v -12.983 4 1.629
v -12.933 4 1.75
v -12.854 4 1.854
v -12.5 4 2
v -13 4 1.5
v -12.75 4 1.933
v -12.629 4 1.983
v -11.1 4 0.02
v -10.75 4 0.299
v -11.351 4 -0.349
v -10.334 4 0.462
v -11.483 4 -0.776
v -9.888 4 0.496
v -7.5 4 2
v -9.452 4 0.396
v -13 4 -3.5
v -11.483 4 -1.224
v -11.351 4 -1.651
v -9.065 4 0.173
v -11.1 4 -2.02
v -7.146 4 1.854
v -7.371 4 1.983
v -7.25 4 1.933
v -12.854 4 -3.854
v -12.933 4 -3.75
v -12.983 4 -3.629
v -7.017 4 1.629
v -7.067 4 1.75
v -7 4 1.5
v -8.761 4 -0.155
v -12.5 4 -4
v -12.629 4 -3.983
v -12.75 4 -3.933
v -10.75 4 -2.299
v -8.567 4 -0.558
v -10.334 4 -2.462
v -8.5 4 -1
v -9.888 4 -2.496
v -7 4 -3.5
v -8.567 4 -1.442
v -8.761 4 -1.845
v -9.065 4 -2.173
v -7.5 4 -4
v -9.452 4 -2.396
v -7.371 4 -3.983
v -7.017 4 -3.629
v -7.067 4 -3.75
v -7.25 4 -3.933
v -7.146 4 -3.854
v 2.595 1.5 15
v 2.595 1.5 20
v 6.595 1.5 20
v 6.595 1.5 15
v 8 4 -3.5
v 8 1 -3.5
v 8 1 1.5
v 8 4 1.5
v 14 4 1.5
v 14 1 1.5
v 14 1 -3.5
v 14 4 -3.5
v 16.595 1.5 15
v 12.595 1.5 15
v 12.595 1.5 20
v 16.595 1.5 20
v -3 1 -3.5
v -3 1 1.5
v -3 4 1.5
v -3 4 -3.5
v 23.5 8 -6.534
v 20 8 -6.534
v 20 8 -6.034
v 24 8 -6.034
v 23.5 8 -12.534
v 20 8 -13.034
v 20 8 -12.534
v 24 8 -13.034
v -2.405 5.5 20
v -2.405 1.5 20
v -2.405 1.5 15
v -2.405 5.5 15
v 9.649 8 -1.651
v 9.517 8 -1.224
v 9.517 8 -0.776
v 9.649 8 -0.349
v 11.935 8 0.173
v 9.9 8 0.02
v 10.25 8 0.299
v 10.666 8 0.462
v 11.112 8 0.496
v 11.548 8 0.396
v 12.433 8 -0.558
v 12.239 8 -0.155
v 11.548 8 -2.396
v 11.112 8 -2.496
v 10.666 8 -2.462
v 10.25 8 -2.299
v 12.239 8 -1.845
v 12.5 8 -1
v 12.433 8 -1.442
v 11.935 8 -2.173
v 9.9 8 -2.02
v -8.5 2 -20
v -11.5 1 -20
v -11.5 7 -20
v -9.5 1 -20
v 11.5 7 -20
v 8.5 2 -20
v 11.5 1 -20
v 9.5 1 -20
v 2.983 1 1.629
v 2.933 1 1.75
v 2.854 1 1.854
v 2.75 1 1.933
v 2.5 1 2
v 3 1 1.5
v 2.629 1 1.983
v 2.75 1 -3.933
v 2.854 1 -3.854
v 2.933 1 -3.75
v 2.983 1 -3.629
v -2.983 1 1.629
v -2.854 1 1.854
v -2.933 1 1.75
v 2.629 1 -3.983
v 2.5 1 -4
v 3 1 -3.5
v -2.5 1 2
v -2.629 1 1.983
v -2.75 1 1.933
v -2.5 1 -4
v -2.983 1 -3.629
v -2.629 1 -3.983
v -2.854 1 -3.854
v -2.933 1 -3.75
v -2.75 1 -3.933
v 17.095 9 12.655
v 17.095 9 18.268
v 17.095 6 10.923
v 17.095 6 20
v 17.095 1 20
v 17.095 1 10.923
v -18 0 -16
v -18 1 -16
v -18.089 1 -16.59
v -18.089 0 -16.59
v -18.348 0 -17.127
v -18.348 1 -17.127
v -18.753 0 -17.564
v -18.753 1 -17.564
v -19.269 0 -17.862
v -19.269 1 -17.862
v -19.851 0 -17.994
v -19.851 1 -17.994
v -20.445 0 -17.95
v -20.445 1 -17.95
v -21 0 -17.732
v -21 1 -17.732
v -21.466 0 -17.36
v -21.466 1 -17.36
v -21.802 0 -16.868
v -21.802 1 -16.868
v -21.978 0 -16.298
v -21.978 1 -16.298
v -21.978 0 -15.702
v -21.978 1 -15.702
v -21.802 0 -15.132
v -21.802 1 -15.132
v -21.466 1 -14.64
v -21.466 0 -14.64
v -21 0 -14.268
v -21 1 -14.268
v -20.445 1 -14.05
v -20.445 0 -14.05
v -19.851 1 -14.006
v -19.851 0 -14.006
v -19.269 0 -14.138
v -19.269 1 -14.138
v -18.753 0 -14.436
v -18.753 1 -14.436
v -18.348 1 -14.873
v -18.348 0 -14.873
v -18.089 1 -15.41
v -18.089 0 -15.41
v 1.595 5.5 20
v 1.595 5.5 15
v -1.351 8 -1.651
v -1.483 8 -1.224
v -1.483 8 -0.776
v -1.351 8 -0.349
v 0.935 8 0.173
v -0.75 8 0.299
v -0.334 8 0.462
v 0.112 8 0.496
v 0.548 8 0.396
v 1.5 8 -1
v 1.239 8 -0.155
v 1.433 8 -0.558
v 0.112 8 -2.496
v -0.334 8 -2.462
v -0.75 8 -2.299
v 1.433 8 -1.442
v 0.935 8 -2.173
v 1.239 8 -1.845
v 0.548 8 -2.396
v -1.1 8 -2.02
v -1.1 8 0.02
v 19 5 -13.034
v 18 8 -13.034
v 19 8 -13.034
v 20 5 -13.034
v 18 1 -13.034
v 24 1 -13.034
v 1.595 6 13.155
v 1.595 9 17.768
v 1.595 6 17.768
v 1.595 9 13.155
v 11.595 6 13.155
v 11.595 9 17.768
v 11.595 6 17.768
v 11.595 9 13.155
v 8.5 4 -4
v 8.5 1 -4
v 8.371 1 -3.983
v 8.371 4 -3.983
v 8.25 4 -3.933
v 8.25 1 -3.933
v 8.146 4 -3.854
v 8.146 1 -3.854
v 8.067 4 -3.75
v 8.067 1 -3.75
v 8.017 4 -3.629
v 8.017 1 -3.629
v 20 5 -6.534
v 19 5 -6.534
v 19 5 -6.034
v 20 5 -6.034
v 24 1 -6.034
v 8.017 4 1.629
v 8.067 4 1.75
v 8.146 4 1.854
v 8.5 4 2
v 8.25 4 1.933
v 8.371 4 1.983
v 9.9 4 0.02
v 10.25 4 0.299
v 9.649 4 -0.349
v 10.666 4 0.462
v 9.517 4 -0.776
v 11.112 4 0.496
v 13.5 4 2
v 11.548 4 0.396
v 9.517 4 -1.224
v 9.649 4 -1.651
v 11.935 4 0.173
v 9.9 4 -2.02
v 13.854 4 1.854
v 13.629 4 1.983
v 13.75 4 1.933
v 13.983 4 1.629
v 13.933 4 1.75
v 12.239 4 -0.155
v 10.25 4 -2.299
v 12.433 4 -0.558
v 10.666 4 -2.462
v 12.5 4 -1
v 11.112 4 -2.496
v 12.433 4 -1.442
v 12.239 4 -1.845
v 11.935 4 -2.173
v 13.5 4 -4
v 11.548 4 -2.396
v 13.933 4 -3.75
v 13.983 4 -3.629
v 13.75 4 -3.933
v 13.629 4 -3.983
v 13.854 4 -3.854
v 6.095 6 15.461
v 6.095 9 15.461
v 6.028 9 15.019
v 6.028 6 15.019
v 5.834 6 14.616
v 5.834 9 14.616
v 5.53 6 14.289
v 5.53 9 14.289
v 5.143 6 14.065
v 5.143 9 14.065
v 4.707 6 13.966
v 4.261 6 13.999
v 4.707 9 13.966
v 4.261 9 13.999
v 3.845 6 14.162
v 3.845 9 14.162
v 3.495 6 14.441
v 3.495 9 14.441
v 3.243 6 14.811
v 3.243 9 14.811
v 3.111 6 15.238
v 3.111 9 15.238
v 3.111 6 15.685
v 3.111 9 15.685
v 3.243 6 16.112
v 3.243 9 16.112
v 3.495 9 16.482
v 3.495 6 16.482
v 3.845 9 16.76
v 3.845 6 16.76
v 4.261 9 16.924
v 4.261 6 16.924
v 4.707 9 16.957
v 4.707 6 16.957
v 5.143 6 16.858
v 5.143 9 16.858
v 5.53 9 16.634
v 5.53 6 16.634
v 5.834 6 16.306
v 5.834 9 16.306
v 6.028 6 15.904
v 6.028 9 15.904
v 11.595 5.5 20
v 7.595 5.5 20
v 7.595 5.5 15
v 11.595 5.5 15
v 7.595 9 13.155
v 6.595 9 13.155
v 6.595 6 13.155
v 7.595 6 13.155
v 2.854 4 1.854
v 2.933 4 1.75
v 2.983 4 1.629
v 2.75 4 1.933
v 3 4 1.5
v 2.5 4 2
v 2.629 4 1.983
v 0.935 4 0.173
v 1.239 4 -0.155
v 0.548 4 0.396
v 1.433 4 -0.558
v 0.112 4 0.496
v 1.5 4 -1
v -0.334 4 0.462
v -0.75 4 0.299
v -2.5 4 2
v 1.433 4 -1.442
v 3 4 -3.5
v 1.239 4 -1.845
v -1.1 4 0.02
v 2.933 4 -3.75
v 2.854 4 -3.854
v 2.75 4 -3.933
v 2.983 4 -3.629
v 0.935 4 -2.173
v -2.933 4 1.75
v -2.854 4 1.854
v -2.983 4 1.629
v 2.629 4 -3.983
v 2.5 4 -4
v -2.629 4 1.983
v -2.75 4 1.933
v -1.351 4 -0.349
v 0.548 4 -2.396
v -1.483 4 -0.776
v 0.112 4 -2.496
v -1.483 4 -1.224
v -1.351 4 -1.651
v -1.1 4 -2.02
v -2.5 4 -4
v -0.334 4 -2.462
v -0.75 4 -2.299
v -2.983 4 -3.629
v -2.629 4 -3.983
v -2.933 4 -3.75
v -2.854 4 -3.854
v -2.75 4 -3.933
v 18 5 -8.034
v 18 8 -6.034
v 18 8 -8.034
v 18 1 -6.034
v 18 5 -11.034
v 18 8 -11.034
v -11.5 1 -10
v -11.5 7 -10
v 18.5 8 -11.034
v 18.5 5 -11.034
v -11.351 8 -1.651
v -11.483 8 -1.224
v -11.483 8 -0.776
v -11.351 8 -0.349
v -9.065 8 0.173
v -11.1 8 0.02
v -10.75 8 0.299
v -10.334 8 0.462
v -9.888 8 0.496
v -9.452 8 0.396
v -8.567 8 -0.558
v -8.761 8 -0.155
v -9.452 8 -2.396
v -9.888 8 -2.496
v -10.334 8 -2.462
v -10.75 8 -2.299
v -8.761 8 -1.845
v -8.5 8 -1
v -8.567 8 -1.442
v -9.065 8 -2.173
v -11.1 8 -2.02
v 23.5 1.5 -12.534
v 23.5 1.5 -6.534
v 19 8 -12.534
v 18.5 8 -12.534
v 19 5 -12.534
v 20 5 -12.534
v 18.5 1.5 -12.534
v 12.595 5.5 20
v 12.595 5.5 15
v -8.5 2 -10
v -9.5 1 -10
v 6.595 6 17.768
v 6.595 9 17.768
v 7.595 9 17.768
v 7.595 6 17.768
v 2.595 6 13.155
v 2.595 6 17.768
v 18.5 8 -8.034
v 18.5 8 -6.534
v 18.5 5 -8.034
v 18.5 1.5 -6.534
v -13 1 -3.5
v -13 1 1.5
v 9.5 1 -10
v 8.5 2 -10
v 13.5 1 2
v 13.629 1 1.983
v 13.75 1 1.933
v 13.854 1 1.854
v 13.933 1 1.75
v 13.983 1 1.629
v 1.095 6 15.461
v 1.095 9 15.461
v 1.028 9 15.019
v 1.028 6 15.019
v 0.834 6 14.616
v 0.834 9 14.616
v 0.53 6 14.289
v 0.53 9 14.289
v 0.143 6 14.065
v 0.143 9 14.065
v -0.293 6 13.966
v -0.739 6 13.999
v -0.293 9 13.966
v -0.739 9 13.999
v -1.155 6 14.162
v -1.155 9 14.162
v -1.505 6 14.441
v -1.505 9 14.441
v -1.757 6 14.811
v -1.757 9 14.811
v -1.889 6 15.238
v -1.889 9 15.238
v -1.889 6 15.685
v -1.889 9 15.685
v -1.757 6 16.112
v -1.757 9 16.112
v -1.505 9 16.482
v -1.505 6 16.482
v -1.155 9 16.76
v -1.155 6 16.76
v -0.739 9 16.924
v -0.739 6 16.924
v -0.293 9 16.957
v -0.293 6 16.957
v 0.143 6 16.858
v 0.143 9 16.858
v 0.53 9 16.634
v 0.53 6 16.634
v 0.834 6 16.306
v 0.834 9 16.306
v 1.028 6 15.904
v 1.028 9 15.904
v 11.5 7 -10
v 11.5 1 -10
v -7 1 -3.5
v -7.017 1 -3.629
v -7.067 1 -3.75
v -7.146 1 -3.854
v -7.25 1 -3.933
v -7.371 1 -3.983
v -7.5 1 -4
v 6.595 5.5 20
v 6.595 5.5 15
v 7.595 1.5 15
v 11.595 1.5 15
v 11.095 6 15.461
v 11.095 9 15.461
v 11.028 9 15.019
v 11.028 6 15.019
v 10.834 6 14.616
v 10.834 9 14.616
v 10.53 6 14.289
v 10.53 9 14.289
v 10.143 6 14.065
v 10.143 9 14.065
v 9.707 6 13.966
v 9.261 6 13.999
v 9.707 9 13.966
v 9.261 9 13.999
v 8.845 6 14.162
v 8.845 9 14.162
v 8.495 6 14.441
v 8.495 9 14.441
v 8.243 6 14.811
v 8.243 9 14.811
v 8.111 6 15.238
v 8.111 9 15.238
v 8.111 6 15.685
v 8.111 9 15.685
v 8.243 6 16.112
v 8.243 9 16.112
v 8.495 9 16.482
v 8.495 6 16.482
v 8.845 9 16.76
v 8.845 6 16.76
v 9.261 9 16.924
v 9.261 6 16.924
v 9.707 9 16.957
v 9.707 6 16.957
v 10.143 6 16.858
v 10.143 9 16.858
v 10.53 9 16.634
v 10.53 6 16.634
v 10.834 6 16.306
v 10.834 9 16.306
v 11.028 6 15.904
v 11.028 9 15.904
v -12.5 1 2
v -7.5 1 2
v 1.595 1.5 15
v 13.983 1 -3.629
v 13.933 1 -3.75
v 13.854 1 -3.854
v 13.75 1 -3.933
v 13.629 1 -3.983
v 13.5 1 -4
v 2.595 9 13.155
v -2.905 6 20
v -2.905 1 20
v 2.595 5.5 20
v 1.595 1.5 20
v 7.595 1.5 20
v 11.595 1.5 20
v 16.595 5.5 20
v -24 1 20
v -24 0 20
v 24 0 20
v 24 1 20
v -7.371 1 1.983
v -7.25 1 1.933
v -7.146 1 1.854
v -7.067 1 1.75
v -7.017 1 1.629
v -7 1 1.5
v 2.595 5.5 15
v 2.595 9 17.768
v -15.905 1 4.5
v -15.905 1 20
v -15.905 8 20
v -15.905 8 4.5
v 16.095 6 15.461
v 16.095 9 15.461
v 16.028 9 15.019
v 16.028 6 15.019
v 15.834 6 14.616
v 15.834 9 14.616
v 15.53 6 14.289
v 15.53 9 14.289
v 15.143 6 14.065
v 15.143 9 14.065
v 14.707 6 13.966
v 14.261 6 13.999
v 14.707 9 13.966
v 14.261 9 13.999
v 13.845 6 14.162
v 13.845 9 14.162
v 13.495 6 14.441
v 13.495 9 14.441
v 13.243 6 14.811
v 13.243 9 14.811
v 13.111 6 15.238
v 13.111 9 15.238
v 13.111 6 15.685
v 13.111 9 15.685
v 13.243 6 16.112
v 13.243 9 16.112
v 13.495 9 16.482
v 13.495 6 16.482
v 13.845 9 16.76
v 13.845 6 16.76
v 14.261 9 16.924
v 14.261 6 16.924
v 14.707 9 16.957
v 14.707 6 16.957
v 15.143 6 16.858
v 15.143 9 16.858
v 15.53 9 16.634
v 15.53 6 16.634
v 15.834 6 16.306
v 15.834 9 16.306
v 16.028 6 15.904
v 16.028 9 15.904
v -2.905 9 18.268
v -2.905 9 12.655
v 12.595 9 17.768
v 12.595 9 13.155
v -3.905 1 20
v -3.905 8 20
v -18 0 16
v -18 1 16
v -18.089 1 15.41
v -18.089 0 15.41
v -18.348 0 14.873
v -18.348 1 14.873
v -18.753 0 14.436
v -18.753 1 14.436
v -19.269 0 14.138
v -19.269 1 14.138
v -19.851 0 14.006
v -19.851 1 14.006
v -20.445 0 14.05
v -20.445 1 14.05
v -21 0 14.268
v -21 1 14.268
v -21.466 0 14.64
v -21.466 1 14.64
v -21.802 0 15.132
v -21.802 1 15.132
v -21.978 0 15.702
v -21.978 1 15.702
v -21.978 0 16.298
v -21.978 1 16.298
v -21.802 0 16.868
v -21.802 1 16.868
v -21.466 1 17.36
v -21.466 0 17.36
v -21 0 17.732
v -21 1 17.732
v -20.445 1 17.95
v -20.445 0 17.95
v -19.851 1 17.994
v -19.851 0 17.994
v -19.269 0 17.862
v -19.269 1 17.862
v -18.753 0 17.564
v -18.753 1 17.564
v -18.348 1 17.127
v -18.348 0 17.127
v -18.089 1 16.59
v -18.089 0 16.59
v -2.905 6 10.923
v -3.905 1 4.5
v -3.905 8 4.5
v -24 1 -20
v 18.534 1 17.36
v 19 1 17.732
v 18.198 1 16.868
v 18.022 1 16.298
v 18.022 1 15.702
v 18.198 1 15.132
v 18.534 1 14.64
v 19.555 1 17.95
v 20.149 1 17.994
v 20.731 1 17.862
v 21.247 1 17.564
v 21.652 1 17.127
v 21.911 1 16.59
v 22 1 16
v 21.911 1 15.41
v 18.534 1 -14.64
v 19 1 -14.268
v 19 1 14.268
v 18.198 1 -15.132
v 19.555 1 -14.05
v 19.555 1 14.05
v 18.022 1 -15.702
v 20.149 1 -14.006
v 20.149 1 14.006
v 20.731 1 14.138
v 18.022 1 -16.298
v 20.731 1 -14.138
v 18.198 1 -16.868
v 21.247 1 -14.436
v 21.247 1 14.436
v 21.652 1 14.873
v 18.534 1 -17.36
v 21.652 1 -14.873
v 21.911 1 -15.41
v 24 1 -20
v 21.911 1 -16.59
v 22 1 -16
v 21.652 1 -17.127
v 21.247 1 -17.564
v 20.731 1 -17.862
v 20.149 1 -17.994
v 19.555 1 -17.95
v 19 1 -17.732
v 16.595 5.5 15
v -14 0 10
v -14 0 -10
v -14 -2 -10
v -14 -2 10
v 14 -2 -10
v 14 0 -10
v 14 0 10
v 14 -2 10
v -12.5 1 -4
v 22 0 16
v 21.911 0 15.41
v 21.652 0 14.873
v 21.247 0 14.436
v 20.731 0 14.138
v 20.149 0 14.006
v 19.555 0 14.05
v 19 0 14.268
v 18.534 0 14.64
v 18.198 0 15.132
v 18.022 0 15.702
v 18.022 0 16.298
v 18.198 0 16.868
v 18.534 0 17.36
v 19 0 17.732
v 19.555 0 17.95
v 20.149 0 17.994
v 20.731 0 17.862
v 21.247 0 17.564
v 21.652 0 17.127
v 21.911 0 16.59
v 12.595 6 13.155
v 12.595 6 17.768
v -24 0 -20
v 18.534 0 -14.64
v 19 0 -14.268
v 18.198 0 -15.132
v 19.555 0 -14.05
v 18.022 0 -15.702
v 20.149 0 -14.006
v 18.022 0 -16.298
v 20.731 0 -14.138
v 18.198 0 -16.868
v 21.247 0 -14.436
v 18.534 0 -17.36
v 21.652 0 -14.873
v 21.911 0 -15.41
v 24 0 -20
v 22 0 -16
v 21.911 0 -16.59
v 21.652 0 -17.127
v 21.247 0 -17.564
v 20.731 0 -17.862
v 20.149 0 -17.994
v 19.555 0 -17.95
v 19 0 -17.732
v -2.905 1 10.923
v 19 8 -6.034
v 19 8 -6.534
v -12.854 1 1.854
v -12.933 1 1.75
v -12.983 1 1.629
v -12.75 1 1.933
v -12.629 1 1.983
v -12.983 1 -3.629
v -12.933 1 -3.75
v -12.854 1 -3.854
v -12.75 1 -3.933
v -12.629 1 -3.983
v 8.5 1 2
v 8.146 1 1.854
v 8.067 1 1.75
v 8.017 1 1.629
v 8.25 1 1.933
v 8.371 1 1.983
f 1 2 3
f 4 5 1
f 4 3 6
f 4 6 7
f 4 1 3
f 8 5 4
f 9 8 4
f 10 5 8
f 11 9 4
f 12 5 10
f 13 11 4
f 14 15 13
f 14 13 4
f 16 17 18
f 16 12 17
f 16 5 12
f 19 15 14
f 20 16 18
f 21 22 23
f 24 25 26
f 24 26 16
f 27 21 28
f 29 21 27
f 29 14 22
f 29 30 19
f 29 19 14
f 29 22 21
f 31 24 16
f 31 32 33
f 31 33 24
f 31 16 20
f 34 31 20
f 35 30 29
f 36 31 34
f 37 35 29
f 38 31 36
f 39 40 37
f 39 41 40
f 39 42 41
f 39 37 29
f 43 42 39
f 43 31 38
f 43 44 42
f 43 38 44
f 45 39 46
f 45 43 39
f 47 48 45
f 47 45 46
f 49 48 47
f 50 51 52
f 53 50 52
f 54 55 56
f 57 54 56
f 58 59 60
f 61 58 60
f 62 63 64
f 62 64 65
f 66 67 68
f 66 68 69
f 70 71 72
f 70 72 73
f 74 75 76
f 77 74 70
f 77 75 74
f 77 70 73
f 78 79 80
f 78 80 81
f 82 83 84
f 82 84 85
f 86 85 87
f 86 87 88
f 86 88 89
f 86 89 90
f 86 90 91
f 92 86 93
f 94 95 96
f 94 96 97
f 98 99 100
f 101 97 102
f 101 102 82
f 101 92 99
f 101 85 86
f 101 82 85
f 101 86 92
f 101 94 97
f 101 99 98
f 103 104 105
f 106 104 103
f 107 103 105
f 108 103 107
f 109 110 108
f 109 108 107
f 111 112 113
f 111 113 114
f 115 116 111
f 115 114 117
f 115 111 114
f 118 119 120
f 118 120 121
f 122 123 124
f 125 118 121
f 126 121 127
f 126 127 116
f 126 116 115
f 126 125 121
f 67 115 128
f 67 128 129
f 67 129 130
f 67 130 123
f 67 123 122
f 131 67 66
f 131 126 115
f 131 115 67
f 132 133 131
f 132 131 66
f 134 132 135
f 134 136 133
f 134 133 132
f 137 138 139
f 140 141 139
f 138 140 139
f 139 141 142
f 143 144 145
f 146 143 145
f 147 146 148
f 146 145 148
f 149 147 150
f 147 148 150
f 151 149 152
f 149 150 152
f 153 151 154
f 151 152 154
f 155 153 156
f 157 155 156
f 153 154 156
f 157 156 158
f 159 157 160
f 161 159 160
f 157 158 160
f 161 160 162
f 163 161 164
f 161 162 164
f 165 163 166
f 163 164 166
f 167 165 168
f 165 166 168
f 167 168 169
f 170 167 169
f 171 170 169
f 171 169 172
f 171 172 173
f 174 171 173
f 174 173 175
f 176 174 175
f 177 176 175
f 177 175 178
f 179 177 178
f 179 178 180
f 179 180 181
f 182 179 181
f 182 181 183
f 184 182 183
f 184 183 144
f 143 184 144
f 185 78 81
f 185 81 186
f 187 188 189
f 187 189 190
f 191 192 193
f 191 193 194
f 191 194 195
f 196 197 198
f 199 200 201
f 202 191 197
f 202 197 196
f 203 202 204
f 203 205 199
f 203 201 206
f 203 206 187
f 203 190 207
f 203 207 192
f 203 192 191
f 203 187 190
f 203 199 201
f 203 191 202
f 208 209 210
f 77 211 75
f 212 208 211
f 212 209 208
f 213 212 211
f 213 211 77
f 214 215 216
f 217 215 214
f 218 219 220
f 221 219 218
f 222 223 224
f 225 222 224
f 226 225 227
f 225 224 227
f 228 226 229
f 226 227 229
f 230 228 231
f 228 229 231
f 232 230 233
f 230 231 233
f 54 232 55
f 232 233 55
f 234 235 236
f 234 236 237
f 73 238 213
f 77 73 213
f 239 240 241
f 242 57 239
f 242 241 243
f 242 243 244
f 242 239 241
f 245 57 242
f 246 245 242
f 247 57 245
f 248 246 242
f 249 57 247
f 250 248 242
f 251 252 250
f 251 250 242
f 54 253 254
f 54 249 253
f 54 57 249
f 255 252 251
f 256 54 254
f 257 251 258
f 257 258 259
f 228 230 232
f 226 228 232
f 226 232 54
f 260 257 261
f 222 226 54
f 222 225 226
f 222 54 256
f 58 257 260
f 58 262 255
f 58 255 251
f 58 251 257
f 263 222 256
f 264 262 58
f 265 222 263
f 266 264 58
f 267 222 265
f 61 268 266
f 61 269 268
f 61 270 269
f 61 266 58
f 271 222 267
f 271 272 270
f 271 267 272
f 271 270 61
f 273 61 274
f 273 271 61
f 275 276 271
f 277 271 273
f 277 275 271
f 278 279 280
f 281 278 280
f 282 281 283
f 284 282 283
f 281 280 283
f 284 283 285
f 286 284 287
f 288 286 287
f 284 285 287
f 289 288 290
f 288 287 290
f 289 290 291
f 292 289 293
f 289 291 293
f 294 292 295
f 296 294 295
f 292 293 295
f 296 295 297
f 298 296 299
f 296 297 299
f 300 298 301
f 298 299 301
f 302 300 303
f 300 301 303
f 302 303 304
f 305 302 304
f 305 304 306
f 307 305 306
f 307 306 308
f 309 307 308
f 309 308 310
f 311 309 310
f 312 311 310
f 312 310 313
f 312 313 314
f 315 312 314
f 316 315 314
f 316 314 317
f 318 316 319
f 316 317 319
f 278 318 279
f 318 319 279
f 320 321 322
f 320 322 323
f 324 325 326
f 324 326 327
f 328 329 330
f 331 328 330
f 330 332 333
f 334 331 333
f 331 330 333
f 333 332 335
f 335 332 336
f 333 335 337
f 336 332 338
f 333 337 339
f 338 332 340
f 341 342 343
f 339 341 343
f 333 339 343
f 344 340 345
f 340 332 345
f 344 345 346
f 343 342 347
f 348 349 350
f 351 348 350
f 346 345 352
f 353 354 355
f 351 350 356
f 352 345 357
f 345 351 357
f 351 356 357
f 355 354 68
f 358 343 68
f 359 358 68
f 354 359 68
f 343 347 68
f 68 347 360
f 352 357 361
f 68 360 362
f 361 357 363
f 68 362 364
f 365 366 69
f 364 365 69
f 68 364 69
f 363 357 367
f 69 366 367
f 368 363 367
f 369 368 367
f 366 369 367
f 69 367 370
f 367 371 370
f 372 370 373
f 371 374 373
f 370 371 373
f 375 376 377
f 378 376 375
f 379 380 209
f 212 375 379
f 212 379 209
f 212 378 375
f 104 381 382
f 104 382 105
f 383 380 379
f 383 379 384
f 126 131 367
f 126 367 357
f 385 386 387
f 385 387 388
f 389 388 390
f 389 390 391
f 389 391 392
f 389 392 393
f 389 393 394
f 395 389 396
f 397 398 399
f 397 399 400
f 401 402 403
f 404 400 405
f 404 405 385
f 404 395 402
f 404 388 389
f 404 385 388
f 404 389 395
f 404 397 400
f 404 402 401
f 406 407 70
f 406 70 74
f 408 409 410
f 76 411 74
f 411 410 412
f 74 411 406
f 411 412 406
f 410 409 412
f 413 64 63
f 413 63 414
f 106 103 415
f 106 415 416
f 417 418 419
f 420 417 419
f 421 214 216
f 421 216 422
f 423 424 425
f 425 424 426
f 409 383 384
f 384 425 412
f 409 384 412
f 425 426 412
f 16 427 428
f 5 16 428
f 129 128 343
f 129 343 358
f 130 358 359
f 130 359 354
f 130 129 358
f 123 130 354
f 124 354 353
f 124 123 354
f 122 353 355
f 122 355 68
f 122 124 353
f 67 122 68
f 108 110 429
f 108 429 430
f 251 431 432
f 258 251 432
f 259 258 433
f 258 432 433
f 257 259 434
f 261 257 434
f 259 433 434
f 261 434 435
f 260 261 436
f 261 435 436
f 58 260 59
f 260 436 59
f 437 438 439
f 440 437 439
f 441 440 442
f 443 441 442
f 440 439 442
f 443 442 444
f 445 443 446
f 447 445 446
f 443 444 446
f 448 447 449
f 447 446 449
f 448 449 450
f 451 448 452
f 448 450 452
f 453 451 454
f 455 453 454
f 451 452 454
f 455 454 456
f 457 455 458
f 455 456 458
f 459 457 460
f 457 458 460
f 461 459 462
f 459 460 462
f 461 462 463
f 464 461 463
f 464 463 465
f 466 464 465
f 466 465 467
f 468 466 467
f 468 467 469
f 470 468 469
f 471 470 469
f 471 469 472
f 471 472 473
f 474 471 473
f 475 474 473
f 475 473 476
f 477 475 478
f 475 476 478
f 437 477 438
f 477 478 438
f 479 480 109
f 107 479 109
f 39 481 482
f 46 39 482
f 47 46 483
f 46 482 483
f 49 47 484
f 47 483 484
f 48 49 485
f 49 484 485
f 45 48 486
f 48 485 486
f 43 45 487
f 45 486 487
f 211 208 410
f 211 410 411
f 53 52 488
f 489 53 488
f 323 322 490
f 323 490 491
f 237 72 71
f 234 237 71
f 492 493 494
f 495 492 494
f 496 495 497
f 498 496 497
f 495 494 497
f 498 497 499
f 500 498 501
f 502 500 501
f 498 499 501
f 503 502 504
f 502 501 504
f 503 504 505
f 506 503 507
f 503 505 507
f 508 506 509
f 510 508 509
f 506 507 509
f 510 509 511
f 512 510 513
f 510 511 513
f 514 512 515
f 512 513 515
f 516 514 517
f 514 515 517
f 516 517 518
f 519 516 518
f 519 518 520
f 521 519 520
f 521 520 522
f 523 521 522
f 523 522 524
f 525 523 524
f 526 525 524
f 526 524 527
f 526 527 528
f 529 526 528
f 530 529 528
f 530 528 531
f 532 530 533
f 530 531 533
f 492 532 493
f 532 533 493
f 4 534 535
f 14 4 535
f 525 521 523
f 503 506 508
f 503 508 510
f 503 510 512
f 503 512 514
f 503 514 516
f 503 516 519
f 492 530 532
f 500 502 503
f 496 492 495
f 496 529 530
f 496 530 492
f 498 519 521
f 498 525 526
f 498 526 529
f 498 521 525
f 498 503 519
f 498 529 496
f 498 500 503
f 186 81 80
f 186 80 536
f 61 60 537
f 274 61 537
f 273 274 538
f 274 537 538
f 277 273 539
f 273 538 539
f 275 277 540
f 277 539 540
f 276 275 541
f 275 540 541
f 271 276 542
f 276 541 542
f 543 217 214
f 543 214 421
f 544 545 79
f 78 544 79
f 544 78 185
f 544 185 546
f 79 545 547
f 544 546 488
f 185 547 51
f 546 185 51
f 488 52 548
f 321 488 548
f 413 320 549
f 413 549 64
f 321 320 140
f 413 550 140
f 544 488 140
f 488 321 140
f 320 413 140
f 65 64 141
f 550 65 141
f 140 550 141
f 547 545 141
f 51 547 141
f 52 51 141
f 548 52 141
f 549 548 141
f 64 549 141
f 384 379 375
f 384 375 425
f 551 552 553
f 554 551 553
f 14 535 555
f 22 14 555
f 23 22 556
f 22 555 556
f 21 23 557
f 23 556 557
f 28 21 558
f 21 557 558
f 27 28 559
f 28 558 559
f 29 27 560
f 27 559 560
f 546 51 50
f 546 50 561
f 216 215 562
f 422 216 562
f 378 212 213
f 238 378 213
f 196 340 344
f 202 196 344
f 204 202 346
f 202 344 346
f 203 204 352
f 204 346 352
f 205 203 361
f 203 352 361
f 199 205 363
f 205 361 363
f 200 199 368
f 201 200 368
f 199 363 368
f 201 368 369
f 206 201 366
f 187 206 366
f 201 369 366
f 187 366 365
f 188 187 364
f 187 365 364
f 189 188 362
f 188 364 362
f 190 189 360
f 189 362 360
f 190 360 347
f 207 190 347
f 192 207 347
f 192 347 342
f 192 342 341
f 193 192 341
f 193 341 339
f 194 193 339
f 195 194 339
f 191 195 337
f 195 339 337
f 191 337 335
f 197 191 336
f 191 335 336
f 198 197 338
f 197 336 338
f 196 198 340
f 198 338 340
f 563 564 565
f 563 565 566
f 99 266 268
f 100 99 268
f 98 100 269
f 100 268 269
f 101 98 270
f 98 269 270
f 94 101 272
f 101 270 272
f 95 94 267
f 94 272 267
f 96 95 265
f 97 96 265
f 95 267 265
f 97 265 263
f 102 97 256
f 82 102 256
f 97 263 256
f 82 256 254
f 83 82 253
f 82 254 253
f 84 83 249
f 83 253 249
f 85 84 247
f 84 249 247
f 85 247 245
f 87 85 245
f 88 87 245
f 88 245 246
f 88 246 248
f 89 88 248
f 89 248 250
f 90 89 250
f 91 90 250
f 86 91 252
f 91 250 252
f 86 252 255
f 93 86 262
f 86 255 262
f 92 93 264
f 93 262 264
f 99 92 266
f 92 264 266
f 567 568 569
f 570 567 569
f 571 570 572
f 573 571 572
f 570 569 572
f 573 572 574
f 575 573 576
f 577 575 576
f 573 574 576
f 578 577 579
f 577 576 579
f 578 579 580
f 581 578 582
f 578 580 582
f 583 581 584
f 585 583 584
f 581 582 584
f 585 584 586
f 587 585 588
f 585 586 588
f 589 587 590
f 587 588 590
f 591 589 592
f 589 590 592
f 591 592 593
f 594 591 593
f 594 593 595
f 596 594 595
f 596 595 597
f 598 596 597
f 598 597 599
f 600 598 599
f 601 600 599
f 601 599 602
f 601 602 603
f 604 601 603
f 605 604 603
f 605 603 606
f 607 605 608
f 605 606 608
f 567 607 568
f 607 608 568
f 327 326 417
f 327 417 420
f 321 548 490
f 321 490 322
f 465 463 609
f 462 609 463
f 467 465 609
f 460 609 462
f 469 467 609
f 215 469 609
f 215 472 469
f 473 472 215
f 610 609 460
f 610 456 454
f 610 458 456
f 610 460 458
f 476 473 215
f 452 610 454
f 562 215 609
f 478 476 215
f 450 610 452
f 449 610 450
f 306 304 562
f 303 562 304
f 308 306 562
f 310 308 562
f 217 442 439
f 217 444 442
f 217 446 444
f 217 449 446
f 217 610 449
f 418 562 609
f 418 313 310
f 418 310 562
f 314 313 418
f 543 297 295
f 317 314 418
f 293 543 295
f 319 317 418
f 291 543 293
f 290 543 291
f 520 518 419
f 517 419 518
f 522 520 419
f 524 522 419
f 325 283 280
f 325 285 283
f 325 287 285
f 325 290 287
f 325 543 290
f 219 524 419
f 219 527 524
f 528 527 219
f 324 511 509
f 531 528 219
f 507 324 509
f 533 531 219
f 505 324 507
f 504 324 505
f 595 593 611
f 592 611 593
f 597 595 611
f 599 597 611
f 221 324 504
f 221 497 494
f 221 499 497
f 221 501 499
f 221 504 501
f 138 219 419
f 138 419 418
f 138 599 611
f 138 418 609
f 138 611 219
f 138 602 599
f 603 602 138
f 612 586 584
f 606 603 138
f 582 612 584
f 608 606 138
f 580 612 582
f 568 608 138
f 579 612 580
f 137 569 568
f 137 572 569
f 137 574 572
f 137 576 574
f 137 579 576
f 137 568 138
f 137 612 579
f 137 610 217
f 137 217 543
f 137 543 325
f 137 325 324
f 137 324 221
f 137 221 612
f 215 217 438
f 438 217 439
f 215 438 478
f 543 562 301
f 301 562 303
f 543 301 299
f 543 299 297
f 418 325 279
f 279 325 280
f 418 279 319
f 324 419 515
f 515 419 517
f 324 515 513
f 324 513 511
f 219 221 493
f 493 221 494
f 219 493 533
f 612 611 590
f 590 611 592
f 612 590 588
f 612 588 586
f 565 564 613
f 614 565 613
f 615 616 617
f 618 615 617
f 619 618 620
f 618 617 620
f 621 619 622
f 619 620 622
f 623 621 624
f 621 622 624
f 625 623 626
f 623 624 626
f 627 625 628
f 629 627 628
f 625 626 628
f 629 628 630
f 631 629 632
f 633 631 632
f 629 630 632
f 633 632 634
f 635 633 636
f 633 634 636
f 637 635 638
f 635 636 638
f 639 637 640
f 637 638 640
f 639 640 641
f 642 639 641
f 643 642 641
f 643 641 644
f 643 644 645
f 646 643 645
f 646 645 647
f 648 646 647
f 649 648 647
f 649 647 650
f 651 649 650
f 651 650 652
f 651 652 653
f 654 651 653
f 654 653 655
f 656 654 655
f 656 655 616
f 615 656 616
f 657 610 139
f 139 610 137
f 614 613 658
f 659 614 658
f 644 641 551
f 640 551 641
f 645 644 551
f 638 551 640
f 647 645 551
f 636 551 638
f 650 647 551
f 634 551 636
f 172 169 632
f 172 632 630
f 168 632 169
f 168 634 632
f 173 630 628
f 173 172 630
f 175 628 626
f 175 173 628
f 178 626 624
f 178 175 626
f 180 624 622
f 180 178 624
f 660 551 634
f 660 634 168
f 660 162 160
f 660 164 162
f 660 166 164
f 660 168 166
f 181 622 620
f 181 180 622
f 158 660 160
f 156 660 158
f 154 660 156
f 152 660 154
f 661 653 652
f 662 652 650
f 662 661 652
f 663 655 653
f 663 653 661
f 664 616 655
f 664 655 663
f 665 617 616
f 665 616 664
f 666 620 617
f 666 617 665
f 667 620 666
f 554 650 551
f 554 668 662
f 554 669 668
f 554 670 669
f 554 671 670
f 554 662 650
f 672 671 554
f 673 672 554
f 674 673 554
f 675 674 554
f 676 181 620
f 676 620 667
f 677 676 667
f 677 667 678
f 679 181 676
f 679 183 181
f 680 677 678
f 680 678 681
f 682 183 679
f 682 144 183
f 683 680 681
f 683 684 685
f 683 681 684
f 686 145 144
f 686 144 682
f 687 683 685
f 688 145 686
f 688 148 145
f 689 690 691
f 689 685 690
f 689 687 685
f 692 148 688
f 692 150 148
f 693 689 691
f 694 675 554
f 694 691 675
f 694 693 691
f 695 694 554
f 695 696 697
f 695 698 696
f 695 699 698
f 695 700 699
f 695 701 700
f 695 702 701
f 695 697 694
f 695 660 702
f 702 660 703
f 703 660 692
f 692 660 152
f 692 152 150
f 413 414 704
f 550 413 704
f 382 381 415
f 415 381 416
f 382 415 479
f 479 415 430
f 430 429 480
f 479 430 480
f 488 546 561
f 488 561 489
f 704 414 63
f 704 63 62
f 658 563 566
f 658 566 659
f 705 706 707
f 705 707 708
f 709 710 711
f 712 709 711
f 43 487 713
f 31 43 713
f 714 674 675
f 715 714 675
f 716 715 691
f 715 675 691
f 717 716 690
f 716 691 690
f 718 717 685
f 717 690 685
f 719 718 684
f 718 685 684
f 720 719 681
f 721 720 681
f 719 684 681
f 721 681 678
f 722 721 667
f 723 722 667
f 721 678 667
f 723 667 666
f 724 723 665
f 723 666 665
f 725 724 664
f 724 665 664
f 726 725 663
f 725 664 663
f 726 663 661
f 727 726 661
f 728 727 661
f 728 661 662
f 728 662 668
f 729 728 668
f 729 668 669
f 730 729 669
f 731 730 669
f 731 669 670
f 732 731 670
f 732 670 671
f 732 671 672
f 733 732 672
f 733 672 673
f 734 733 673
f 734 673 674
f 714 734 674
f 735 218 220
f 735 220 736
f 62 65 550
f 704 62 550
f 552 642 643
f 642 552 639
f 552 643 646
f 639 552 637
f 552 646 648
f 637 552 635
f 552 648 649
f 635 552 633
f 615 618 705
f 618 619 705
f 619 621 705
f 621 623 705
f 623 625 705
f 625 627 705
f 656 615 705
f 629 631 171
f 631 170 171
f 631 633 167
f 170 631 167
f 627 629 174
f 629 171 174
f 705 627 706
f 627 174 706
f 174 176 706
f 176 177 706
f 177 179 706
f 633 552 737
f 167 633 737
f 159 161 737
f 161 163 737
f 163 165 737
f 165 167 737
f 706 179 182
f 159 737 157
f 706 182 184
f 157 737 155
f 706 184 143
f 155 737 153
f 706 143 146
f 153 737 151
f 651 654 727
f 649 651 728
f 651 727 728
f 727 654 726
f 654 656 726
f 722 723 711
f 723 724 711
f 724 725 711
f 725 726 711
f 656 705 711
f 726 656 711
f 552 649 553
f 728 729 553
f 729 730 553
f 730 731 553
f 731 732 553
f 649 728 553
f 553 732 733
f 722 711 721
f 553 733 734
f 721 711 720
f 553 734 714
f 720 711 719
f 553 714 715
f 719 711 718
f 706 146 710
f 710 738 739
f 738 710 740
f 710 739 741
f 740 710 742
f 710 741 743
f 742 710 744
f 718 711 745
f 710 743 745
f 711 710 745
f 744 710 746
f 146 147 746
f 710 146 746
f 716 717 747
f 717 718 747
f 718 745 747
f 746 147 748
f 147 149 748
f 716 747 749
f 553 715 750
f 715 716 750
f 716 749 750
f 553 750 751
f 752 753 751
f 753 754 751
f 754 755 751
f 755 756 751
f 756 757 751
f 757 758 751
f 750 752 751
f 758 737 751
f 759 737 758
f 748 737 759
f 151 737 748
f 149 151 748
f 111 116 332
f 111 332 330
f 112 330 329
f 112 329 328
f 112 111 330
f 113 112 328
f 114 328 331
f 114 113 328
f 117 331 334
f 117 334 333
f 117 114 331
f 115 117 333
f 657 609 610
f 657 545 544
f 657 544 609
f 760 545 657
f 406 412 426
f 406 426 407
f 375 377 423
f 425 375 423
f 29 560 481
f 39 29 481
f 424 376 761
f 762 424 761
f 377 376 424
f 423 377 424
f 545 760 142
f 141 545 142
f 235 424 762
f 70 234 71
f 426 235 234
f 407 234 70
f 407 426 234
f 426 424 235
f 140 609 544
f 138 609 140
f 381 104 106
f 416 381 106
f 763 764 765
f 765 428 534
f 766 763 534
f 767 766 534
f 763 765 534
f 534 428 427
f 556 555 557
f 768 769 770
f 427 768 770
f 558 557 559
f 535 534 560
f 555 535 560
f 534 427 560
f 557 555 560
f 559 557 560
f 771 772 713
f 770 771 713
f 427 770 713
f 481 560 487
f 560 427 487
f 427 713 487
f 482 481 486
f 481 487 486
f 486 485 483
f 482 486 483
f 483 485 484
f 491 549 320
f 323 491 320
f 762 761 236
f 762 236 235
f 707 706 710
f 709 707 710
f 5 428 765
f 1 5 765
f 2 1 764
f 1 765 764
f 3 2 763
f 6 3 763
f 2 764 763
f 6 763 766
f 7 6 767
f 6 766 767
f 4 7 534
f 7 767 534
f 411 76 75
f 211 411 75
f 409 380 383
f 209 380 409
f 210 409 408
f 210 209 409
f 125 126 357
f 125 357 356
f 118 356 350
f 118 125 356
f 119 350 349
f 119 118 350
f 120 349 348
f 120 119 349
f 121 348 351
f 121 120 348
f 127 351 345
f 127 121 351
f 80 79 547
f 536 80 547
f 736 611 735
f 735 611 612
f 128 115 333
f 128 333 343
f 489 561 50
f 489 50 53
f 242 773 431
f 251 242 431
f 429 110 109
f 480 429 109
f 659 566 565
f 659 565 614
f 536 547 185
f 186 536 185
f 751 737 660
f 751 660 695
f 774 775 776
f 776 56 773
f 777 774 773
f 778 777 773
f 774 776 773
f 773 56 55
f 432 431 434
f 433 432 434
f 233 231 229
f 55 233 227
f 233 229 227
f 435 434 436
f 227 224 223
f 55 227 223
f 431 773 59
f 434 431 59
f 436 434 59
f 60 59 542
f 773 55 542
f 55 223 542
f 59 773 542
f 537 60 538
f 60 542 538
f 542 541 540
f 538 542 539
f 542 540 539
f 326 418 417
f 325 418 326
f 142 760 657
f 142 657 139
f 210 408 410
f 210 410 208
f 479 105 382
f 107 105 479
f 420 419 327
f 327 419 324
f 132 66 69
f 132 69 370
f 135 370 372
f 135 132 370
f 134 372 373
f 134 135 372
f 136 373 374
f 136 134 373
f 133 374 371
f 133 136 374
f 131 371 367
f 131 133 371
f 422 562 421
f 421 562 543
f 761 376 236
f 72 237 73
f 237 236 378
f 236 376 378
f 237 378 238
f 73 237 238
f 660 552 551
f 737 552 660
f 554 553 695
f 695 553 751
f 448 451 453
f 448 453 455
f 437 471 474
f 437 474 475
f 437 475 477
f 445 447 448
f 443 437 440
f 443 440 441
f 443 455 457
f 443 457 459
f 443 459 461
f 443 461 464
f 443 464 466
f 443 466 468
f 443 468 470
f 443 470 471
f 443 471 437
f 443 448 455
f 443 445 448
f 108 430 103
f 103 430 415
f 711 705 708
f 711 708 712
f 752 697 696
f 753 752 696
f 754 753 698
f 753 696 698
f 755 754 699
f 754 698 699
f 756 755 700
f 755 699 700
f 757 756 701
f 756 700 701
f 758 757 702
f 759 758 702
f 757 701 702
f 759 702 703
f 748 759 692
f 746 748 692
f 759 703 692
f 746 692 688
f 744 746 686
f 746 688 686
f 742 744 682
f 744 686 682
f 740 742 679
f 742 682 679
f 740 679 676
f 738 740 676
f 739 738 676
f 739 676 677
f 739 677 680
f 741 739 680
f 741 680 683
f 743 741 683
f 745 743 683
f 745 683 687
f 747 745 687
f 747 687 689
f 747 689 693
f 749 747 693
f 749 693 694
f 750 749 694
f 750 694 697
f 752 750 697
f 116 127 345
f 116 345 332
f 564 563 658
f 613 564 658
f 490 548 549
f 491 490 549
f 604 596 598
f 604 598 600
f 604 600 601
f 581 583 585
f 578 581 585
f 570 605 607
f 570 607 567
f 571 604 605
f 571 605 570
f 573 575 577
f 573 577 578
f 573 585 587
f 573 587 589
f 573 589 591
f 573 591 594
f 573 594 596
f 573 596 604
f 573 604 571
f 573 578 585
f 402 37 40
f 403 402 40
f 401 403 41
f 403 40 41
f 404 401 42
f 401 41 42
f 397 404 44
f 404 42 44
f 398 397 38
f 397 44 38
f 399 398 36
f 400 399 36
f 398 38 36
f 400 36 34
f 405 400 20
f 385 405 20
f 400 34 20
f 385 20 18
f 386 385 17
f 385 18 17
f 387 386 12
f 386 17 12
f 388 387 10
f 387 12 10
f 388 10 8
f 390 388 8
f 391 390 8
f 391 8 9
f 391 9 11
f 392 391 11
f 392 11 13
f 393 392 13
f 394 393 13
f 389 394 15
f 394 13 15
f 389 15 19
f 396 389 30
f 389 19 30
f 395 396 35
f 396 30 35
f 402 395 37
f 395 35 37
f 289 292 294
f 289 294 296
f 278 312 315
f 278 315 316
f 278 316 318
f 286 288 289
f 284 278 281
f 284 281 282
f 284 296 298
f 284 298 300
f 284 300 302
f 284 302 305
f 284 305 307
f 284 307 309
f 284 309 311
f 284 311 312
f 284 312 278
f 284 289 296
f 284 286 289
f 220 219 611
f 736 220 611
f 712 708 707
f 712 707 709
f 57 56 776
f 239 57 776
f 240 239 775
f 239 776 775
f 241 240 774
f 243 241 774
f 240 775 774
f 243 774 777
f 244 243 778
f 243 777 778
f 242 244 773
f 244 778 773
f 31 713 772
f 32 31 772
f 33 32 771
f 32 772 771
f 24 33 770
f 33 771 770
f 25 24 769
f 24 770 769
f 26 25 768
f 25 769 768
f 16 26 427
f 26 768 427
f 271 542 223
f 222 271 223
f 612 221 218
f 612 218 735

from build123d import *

# Parameters (mm, degrees)
SKETCH1_W             = 48
SKETCH1_H             = 40
BOSS_EXTRUDE1_DEPTH   = 1
SKETCH2_W             = 28
SKETCH2_H             = 20
BOSS_EXTRUDE2_DEPTH   = 2
SKETCH3_R             = 2
CUT_EXTRUDE1_DEPTH    = 4
SKETCH4_W             = 23
SKETCH4_H             = 10
BOSS_EXTRUDE3_DEPTH   = 6
SKETCH5_W             = 6
SKETCH5_H             = 7
BOSS_EXTRUDE4_DEPTH   = 7
SHELL1_T              = -0.5
SKETCH6_W             = 1
SKETCH6_H             = 0.5
SKETCH6_W_2           = 0.5
SKETCH6_H_2           = 3
CUT_EXTRUDE2_DEPTH    = 3
CUT_EXTRUDE3_DEPTH    = 11
SKETCH8_W             = 12
SKETCH8_H             = 15.5
BOSS_EXTRUDE5_DEPTH   = 7
SKETCH9_W             = 20
SKETCH9_H             = 9.077096831
BOSS_EXTRUDE6_DEPTH   = 8
CHAMFER1_SIZE         = 3
CHAMFER1_SIZE2        = 1.732050808
CHAMFER1_PART_2_SIZE  = 3
CHAMFER1_PART_2_SIZE2 = 1.732050808
SKETCH10_W            = 4
SKETCH10_H            = 4
CUT_EXTRUDE4_DEPTH    = 5
SKETCH11_R            = 1.5
SKETCH11_W            = 1
SKETCH11_H            = 4.612995216
CUT_EXTRUDE5_DEPTH    = 3
BOSS_EXTRUDE7_DEPTH   = 3
BOSS_EXTRUDE7_2_DEPTH = 3
BOSS_EXTRUDE7_3_DEPTH = 3
SKETCH13_R            = 1.5
BOSS_EXTRUDE8_DEPTH   = 4


with BuildPart() as part:
    # Sketch1 → Boss-Extrude1 (new body)
    with BuildSketch(Plane(origin=(0, 0, 0), x_dir=(1, 0, 0), z_dir=(0, 1, 0))):
        Rectangle(SKETCH1_W, SKETCH1_H)
    extrude(amount=BOSS_EXTRUDE1_DEPTH)

    # Sketch2 → Boss-Extrude2 (add)
    with BuildSketch(Plane.XZ):
        Rectangle(SKETCH2_W, SKETCH2_H)
    extrude(amount=BOSS_EXTRUDE2_DEPTH)

    # Sketch3 → Cut-Extrude1 (cut, through all)
    with BuildSketch(Plane(origin=(0, 1, 0), x_dir=(1, 0, 0), z_dir=(0, 1, 0))):
        with Locations((-20, -16)):
            Circle(SKETCH3_R)
        with Locations((20, -16)):
            Circle(SKETCH3_R)
        with Locations((20, 16)):
            Circle(SKETCH3_R)
        with Locations((-20, 16)):
            Circle(SKETCH3_R)
    extrude(amount=-CUT_EXTRUDE1_DEPTH, mode=Mode.SUBTRACT)


with BuildPart() as body_2:
    # Sketch4 → Boss-Extrude3 (new body)
    with BuildSketch(Plane(origin=(0, 1, 0), x_dir=(1, 0, 0), z_dir=(0, 1, 0))):
        with Locations((0, 15)):
            Rectangle(SKETCH4_W, SKETCH4_H)
    extrude(amount=BOSS_EXTRUDE3_DEPTH)

    # Sketch7 → Cut-Extrude3 (cut, through all)
    with BuildSketch(Plane.XY.offset(-10)):
        Polygon((-9.5, 1), (9.5, 1), (8.5, 2), (-8.5, 2), align=None)
    extrude(amount=-CUT_EXTRUDE3_DEPTH, mode=Mode.SUBTRACT)


with BuildPart() as body_3:
    # Sketch5 → Boss-Extrude4 (new body)
    with BuildSketch(Plane(origin=(0, 1, 0), x_dir=(1, 0, 0), z_dir=(0, 1, 0))):
        with Locations((21, 9.533602838)):
            Rectangle(SKETCH5_W, SKETCH5_H)
    extrude(amount=BOSS_EXTRUDE4_DEPTH)

    # Shell1
    shell1_openings = [body_3.faces().sort_by_distance(p)[0] for p in [
        (21, 8, -9.533602838),
    ]]
    offset(amount=SHELL1_T, openings=shell1_openings, kind=Kind.INTERSECTION)

    # Sketch6 → Cut-Extrude2 (cut)
    with BuildSketch(Plane(origin=(0, 8, 0), x_dir=(1, 0, 0), z_dir=(0, 1, 0))):
        with Locations((19.5, 12.783602838)):
            Rectangle(SKETCH6_W, SKETCH6_H)
        with Locations((18.25, 9.533602838)):
            Rectangle(SKETCH6_W_2, SKETCH6_H_2)
        with Locations((19.5, 6.283602838)):
            Rectangle(SKETCH6_W, SKETCH6_H)
    extrude(amount=-CUT_EXTRUDE2_DEPTH, mode=Mode.SUBTRACT)


with BuildPart() as body_4:
    # Sketch8 → Boss-Extrude5 (new body, through all)
    with BuildSketch(Plane(origin=(0, 1, 0), x_dir=(1, 0, 0), z_dir=(0, 1, 0))):
        with Locations((-9.905413633, -12.25)):
            Rectangle(SKETCH8_W, SKETCH8_H)
    extrude(amount=BOSS_EXTRUDE5_DEPTH)


with BuildPart() as body_5:
    # Sketch9 → Boss-Extrude6 (new body)
    with BuildSketch(Plane(origin=(0, 1, 0), x_dir=(1, 0, 0), z_dir=(0, 1, 0))):
        with Locations((7.094586367, -15.461451585)):
            Rectangle(SKETCH9_W, SKETCH9_H)
    extrude(amount=BOSS_EXTRUDE6_DEPTH)

    # Chamfer1
    chamfer1_edges = [body_5.edges().sort_by_distance(p)[0] for p in [
        (7.094586367, 9, 10.922903169),
    ]]
    chamfer1_side = [body_5.faces().sort_by_distance(p)[0] for p in [
        (7.094586367, 5, 10.922903169),
    ]]
    chamfer(chamfer1_edges, length=CHAMFER1_SIZE, length2=CHAMFER1_SIZE2, reference=chamfer1_side[0])

    # Chamfer1 part 2
    chamfer1_part_2_edges = [body_5.edges().sort_by_distance(p)[0] for p in [
        (7.094586367, 9, 20),
    ]]
    chamfer1_part_2_side = [body_5.faces().sort_by_distance(p)[0] for p in [
        (7.094586367, 5, 20),
    ]]
    chamfer(chamfer1_part_2_edges, length=CHAMFER1_PART_2_SIZE, length2=CHAMFER1_PART_2_SIZE2, reference=chamfer1_part_2_side[0])

    # Sketch10 → Cut-Extrude4 (cut)
    with BuildSketch(Plane.XY.offset(20)):
        with Locations((14.594586367, 3.5)):
            Rectangle(SKETCH10_W, SKETCH10_H)
        with Locations((9.594586367, 3.5)):
            Rectangle(SKETCH10_W, SKETCH10_H)
        with Locations((4.594586367, 3.5)):
            Rectangle(SKETCH10_W, SKETCH10_H)
        with Locations((-0.405413633, 3.5)):
            Rectangle(SKETCH10_W, SKETCH10_H)
    extrude(amount=-CUT_EXTRUDE4_DEPTH, mode=Mode.SUBTRACT)

    # Sketch11 → Cut-Extrude5 (cut)
    with BuildSketch(Plane(origin=(0, 9, 0), x_dir=(1, 0, 0), z_dir=(0, 1, 0))):
        with Locations((14.594586367, -15.461451584)):
            Circle(SKETCH11_R)
        with Locations((9.594586367, -15.461451584)):
            Circle(SKETCH11_R)
        with Locations((4.594586367, -15.461451584)):
            Circle(SKETCH11_R)
        with Locations((-0.405413633, -15.461451584)):
            Circle(SKETCH11_R)
        with Locations((12.094586367, -15.461451584)):
            Rectangle(SKETCH11_W, SKETCH11_H)
        with Locations((7.094586367, -15.461451584)):
            Rectangle(SKETCH11_W, SKETCH11_H)
        with Locations((2.094586367, -15.461451584)):
            Rectangle(SKETCH11_W, SKETCH11_H)
    extrude(amount=-CUT_EXTRUDE5_DEPTH, mode=Mode.SUBTRACT)


with BuildPart() as body_6:
    # Sketch12 → Boss-Extrude7 (new body)
    with BuildSketch(Plane(origin=(0, 1, 0), x_dir=(1, 0, 0), z_dir=(0, 1, 0))):
        with BuildLine():
            Line((-2.5, 4), (2.5, 4))
            ThreePointArc((2.5, 4), (2.853553391, 3.853553391), (3, 3.5))
            Line((3, 3.5), (3, -1.5))
            ThreePointArc((3, -1.5), (2.853553391, -1.853553391), (2.5, -2))
            Line((2.5, -2), (-2.5, -2))
            ThreePointArc((-2.5, -2), (-2.853553391, -1.853553391), (-3, -1.5))
            Line((-3, -1.5), (-3, 3.5))
            ThreePointArc((-3, 3.5), (-2.853553391, 3.853553391), (-2.5, 4))
        make_face()
    extrude(amount=BOSS_EXTRUDE7_DEPTH)



with BuildPart() as body_7:
    # Sketch12 → Boss-Extrude7 2 (new body)
    with BuildSketch(Plane(origin=(0, 1, 0), x_dir=(1, 0, 0), z_dir=(0, 1, 0))):
        with BuildLine():
            Line((-13, 3.5), (-13, -1.5))
            ThreePointArc((-13, -1.5), (-12.853553391, -1.853553391), (-12.5, -2))
            Line((-12.5, -2), (-7.5, -2))
            ThreePointArc((-7.5, -2), (-7.146446609, -1.853553391), (-7, -1.5))
            Line((-7, -1.5), (-7, 3.5))
            ThreePointArc((-7, 3.5), (-7.146446609, 3.853553391), (-7.5, 4))
            Line((-7.5, 4), (-12.5, 4))
            ThreePointArc((-12.5, 4), (-12.853553391, 3.853553391), (-13, 3.5))
        make_face()
    extrude(amount=BOSS_EXTRUDE7_2_DEPTH)


with BuildPart() as body_8:
    # Sketch12 → Boss-Extrude7 3 (new body)
    with BuildSketch(Plane(origin=(0, 1, 0), x_dir=(1, 0, 0), z_dir=(0, 1, 0))):
        with BuildLine():
            Line((8, 3.5), (8, -1.5))
            ThreePointArc((8, -1.5), (8.146446609, -1.853553391), (8.5, -2))
            Line((8.5, -2), (13.5, -2))
            ThreePointArc((13.5, -2), (13.853553391, -1.853553391), (14, -1.5))
            Line((14, -1.5), (14, 3.5))
            ThreePointArc((14, 3.5), (13.853553391, 3.853553391), (13.5, 4))
            Line((13.5, 4), (8.5, 4))
            ThreePointArc((8.5, 4), (8.146446609, 3.853553391), (8, 3.5))
        make_face()
    extrude(amount=BOSS_EXTRUDE7_3_DEPTH)


with BuildPart() as body_6_1:
    add(body_6.part)

    add(body_7.part)  # Boss-Extrude8 merges body 7

    add(body_8.part)  # Boss-Extrude8 merges body 8
    # Sketch13 → Boss-Extrude8 (add)
    with BuildSketch(Plane(origin=(0, 4, 0), x_dir=(1, 0, 0), z_dir=(0, 1, 0))):
        with Locations((0, 1)):
            Circle(SKETCH13_R)
        with Locations((11, 1)):
            Circle(SKETCH13_R)
        with Locations((-10, 1)):
            Circle(SKETCH13_R)
    extrude(amount=BOSS_EXTRUDE8_DEPTH)


solid = Compound([part.part, body_2.part, body_3.part, body_4.part, body_5.part, body_6_1.part])
